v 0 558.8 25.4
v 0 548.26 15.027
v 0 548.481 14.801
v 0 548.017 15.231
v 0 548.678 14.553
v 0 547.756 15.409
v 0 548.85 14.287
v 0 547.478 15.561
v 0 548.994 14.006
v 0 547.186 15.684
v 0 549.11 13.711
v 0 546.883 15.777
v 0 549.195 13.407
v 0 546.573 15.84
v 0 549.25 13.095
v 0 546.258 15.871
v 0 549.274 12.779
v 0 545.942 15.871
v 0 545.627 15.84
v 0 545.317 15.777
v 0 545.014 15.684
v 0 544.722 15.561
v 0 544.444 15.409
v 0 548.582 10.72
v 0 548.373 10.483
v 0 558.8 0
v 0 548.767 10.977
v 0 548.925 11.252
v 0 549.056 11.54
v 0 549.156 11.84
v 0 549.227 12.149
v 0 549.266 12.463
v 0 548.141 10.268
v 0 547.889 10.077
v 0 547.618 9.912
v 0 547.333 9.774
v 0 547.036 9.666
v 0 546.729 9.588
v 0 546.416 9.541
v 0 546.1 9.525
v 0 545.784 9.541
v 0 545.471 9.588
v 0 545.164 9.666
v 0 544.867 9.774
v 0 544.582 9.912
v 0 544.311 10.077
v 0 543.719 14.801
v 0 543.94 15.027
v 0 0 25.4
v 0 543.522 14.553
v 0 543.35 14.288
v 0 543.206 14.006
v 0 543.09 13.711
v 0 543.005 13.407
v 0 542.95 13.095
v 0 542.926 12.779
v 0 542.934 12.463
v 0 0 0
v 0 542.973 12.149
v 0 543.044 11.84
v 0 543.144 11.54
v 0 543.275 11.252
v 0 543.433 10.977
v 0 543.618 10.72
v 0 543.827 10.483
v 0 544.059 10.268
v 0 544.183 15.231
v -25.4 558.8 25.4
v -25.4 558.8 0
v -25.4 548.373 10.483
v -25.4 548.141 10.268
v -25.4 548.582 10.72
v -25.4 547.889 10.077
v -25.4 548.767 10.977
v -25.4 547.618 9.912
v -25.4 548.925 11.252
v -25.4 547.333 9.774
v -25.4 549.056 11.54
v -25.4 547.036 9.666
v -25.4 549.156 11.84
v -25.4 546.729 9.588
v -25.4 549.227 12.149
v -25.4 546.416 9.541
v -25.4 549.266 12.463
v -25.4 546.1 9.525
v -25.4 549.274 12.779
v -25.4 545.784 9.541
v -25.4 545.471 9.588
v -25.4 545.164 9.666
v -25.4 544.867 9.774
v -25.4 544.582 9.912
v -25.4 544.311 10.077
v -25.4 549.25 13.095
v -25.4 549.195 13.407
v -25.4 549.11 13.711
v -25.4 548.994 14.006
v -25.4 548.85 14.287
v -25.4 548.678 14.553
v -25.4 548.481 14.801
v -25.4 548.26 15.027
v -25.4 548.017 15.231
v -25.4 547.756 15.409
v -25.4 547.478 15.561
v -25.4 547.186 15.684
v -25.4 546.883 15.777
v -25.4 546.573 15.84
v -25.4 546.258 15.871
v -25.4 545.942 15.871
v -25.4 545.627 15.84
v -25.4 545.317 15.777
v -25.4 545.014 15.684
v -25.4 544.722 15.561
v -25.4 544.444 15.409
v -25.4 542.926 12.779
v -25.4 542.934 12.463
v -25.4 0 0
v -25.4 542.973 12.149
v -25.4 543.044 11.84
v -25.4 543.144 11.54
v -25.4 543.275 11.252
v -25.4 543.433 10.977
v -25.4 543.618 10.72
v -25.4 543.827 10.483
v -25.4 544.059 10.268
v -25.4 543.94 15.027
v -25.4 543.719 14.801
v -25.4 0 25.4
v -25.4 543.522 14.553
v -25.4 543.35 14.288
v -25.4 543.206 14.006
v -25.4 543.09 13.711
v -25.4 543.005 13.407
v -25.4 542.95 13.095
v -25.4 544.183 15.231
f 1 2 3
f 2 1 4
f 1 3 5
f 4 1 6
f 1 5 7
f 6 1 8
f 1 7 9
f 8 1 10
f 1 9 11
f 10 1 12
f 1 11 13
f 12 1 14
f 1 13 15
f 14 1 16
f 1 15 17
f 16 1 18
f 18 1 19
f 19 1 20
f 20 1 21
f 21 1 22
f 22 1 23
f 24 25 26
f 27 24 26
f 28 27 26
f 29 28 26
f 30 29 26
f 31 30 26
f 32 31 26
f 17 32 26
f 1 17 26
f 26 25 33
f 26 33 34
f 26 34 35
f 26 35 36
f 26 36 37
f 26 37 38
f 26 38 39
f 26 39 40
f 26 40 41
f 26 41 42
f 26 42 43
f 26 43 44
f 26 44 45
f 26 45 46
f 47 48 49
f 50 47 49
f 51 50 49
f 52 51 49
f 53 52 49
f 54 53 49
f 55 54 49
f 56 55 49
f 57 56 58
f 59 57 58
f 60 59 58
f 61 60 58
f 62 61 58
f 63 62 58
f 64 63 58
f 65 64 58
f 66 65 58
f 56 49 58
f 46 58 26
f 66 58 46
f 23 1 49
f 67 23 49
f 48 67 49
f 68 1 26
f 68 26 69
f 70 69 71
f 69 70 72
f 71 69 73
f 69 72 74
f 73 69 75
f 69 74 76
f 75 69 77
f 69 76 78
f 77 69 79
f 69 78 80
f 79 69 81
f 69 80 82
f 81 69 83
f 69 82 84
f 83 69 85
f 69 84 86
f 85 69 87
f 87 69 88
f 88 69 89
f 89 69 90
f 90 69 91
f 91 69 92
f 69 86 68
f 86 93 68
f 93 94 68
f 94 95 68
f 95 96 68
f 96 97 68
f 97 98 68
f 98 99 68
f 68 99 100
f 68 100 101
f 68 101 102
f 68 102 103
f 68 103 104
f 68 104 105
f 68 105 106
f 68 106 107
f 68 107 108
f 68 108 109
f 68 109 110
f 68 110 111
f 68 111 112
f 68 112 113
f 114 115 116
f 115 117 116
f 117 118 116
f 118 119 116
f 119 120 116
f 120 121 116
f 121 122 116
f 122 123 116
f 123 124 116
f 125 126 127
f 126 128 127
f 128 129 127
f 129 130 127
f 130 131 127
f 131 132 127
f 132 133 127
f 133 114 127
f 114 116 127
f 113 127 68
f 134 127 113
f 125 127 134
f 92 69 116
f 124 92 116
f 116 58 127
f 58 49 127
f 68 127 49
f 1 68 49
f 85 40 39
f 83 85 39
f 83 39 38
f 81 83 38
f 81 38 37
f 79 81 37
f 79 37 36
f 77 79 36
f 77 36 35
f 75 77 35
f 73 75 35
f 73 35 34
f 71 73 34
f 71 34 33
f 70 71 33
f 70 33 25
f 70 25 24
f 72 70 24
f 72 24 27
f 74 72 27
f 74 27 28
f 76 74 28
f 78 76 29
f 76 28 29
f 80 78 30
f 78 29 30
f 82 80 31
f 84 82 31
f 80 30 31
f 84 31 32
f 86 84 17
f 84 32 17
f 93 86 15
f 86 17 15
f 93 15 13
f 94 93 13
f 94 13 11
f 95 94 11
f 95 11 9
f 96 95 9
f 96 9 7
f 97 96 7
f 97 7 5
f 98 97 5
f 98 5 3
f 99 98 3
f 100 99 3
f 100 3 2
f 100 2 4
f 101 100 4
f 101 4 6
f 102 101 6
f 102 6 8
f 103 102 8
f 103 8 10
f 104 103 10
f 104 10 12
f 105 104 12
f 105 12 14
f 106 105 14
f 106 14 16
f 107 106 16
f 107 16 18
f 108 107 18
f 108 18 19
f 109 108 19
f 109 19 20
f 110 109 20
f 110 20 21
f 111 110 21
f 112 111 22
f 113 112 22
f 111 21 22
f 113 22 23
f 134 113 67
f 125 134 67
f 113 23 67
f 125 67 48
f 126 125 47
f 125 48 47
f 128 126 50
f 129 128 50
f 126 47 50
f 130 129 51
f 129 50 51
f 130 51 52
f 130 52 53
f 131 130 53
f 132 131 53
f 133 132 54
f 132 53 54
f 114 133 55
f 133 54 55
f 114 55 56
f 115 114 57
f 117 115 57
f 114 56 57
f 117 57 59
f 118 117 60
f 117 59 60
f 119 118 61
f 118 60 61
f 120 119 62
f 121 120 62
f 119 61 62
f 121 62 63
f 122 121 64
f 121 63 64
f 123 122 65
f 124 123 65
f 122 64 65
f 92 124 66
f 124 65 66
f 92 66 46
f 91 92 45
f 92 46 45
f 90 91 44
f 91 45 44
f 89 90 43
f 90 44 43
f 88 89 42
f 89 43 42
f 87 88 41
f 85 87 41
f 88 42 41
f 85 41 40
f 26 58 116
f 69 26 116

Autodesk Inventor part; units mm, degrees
ref_plane "YZ Plane" through (0, 0, 0) normal (1, 0, 0) x (0, 1, 0)
ref_plane "XZ Plane" through (0, 0, 0) normal (0, 1, 0) x (-1, 0, 0)
ref_plane "XY Plane" through (0, 0, 0) normal (0, 0, 1) x (1, 0, 0)
sketch "Sketch1" plane through (0, 0, 0) normal (0, 1, 0) x (-1, 0, 0)
  line L0 (0, 0) -> (25.4, 0)
  line L1 (25.4, 0) -> (25.4, 25.4)
  line L2 (25.4, 25.4) -> (0, 25.4)
  line L3 (0, 25.4) -> (0, 0)
  dimension "d0" = 25.4
  dimension "d1" = 25.4
extrude "Extrusion1" add sketch "Sketch1" along normal blind 558.8
sketch "Sketch2" plane through (0, 0, 25.4) normal (1, 0, 0) x (0, 0, -1)
  line L0 (25.4, 0) -> (25.4, 558.8) projected
  line L1 (0, 558.8) -> (25.4, 558.8) projected
  circle A0 centre (12.7, 546.1) radius 3.175
  dimension "d4" = 6.35
  dimension "d5" = 12.7
  dimension "d6" = 12.7
extrude "Extrusion2" cut sketch "Sketch2" against normal blind 50.8
properties part number "hardstop length"
